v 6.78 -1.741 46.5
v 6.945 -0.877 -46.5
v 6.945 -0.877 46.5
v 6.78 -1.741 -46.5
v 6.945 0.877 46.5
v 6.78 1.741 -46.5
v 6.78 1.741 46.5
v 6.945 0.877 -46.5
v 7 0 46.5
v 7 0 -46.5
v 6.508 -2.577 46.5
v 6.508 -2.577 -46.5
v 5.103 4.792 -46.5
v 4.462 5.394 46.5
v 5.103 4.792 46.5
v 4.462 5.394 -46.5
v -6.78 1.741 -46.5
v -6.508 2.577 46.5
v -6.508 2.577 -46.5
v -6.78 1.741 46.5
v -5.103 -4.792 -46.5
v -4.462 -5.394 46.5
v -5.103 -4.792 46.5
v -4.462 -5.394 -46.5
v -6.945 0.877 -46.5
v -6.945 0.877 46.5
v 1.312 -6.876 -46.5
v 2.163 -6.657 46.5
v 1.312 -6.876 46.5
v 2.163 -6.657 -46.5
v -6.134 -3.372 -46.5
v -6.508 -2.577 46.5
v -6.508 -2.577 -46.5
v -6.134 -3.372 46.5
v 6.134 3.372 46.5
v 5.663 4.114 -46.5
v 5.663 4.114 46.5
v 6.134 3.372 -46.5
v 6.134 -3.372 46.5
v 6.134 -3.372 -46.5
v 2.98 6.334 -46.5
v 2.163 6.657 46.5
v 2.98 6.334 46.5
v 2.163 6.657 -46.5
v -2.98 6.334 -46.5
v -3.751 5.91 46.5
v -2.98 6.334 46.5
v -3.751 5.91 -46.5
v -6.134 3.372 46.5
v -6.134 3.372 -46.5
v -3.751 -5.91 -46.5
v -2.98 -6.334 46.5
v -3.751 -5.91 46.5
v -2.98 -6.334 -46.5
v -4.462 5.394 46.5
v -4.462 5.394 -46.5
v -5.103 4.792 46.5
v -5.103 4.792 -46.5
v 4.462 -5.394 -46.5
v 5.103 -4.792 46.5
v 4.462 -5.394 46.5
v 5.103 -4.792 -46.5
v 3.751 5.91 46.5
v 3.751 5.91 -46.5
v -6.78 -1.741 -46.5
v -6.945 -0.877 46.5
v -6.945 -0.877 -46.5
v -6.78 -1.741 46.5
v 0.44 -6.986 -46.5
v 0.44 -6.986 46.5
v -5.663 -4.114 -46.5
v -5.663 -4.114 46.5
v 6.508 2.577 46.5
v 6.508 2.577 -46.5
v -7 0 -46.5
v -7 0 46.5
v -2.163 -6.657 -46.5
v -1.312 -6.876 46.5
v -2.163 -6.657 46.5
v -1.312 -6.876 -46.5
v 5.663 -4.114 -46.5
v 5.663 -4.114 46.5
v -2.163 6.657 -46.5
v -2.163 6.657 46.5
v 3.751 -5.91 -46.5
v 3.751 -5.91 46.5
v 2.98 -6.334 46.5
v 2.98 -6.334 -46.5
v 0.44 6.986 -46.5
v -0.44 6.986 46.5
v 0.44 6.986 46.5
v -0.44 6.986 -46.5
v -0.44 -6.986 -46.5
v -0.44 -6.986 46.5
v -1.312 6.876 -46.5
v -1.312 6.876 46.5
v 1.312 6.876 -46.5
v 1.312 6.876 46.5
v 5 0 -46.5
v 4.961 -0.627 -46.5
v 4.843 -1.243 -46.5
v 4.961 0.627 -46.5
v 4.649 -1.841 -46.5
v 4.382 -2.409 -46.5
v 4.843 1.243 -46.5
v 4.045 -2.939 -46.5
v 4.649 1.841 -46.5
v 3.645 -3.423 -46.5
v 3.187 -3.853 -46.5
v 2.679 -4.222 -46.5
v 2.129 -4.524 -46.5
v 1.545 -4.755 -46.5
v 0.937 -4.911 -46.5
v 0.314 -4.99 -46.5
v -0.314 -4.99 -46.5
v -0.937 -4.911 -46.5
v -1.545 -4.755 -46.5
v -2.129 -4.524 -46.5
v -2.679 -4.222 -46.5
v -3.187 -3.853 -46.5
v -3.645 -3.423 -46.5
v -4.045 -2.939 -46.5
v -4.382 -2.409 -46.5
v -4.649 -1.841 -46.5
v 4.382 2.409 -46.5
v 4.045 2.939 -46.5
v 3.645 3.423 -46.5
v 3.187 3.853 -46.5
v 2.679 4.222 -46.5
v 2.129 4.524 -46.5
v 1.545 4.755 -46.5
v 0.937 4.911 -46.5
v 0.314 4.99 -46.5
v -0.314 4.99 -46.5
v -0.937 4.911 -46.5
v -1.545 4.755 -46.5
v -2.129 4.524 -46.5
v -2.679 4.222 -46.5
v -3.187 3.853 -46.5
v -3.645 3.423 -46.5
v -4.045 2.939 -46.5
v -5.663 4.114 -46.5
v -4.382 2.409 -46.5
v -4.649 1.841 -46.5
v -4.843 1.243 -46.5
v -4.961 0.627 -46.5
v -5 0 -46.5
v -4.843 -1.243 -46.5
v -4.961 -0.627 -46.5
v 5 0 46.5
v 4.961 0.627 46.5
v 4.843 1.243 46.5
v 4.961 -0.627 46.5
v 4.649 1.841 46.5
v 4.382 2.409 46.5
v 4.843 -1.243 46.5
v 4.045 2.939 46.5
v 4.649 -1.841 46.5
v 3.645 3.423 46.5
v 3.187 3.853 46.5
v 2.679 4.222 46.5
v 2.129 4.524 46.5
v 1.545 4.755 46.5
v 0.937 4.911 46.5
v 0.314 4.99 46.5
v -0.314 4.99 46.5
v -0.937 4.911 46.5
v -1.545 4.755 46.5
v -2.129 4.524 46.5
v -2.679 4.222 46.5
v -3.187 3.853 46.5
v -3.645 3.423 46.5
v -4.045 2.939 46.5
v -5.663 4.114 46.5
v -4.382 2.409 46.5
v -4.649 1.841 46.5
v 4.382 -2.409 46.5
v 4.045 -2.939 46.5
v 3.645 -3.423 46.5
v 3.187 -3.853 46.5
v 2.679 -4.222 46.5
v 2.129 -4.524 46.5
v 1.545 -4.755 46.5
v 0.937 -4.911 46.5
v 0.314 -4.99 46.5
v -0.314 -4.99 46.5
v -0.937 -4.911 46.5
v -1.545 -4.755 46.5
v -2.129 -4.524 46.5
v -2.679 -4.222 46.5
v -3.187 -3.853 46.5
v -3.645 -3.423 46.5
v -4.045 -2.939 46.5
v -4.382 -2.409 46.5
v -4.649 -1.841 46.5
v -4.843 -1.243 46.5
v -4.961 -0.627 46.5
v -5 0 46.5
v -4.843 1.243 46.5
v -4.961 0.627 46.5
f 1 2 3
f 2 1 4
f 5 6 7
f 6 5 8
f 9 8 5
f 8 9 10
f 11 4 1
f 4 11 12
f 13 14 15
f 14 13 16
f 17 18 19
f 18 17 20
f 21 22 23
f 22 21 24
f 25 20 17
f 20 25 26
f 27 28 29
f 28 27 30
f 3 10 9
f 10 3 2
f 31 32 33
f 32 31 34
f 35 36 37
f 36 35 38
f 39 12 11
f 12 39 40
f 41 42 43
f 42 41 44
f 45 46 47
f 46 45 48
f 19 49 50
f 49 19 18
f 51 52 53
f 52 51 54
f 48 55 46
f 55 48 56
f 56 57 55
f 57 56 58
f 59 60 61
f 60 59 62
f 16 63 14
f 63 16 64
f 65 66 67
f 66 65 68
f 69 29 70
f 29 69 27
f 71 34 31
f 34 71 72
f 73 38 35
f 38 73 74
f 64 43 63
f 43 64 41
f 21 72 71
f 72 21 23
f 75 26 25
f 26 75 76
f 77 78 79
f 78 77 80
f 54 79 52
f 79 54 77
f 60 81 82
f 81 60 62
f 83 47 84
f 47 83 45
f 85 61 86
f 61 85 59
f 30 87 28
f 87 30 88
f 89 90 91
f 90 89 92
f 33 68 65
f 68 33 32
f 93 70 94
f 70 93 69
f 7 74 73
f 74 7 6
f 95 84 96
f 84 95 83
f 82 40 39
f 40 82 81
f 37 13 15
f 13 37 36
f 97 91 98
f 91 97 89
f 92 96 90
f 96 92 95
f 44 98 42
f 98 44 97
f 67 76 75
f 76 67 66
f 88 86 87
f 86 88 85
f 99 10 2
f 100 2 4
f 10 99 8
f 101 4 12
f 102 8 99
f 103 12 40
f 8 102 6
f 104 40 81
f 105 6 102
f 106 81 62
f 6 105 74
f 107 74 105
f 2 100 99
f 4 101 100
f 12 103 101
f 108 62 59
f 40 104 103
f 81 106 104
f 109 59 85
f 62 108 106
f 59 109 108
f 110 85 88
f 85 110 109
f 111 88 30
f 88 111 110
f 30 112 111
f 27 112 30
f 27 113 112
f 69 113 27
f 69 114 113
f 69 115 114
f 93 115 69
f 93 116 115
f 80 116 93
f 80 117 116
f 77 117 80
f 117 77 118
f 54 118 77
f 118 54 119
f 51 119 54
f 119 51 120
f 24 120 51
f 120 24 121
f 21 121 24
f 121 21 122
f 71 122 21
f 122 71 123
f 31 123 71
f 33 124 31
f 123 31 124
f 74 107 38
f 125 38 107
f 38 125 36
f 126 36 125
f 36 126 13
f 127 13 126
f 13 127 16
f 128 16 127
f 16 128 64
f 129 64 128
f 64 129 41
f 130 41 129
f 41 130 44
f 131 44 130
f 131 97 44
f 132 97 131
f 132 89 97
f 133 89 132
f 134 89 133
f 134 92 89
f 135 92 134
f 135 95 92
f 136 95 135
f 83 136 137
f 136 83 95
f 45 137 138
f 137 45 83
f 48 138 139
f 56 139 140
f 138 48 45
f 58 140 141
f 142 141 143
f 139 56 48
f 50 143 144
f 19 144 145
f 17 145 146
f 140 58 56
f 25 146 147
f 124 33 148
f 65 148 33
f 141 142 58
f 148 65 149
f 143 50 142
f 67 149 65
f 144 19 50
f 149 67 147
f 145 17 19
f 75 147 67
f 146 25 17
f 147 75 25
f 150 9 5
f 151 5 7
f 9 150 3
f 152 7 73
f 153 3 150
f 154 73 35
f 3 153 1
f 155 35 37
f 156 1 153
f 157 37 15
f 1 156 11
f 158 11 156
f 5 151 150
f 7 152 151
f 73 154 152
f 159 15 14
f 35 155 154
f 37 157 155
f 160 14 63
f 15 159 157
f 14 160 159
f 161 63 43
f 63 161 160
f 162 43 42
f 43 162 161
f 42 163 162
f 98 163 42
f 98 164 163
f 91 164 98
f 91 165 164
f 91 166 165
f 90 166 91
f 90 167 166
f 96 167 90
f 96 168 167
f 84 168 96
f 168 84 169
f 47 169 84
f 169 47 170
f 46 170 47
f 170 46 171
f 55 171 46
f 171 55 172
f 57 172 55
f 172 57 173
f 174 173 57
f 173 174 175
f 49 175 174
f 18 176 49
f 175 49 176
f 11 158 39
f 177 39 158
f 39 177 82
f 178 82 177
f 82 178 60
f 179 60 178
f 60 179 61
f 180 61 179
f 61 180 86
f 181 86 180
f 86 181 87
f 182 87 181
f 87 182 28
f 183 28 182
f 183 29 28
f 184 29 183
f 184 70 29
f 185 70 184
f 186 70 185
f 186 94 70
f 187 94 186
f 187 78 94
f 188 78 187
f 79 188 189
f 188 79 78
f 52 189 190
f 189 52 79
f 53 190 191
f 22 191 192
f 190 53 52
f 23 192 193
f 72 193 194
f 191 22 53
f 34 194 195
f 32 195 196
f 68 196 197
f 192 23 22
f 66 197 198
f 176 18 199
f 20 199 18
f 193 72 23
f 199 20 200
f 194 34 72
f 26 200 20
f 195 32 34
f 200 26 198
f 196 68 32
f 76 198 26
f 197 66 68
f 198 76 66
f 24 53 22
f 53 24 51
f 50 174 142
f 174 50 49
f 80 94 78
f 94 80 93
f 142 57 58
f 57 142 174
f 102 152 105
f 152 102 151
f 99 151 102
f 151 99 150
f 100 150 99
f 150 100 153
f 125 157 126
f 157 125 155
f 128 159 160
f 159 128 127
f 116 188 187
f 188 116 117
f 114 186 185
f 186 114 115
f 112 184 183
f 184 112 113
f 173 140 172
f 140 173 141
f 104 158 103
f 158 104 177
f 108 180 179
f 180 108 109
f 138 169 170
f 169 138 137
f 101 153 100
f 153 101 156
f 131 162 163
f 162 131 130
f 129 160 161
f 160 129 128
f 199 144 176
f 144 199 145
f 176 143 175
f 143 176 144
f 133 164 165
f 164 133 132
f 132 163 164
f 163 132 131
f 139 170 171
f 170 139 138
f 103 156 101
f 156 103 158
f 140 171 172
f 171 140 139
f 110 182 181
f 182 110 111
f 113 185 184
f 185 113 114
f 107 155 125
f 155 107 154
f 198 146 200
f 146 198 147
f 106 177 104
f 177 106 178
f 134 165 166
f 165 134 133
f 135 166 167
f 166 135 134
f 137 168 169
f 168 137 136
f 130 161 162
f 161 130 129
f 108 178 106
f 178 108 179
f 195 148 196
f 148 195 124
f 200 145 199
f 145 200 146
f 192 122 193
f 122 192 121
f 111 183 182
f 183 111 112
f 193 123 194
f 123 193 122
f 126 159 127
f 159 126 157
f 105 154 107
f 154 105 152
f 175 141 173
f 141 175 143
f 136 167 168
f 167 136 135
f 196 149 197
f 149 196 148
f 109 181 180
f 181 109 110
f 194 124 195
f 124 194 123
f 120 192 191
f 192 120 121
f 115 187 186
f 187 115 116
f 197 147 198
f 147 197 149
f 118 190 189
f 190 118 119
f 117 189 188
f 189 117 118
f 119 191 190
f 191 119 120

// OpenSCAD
$fn = 50;


difference() {
	union() {
		translate(v = [0, 0, -46.5000000000]) {
			cylinder(h = 93, r = 7.0000000000);
		}
	}
	union() {
		translate(v = [0, 0, -100.0000000000]) {
			cylinder(h = 200, r = 5.0000000000);
		}
	}
}
